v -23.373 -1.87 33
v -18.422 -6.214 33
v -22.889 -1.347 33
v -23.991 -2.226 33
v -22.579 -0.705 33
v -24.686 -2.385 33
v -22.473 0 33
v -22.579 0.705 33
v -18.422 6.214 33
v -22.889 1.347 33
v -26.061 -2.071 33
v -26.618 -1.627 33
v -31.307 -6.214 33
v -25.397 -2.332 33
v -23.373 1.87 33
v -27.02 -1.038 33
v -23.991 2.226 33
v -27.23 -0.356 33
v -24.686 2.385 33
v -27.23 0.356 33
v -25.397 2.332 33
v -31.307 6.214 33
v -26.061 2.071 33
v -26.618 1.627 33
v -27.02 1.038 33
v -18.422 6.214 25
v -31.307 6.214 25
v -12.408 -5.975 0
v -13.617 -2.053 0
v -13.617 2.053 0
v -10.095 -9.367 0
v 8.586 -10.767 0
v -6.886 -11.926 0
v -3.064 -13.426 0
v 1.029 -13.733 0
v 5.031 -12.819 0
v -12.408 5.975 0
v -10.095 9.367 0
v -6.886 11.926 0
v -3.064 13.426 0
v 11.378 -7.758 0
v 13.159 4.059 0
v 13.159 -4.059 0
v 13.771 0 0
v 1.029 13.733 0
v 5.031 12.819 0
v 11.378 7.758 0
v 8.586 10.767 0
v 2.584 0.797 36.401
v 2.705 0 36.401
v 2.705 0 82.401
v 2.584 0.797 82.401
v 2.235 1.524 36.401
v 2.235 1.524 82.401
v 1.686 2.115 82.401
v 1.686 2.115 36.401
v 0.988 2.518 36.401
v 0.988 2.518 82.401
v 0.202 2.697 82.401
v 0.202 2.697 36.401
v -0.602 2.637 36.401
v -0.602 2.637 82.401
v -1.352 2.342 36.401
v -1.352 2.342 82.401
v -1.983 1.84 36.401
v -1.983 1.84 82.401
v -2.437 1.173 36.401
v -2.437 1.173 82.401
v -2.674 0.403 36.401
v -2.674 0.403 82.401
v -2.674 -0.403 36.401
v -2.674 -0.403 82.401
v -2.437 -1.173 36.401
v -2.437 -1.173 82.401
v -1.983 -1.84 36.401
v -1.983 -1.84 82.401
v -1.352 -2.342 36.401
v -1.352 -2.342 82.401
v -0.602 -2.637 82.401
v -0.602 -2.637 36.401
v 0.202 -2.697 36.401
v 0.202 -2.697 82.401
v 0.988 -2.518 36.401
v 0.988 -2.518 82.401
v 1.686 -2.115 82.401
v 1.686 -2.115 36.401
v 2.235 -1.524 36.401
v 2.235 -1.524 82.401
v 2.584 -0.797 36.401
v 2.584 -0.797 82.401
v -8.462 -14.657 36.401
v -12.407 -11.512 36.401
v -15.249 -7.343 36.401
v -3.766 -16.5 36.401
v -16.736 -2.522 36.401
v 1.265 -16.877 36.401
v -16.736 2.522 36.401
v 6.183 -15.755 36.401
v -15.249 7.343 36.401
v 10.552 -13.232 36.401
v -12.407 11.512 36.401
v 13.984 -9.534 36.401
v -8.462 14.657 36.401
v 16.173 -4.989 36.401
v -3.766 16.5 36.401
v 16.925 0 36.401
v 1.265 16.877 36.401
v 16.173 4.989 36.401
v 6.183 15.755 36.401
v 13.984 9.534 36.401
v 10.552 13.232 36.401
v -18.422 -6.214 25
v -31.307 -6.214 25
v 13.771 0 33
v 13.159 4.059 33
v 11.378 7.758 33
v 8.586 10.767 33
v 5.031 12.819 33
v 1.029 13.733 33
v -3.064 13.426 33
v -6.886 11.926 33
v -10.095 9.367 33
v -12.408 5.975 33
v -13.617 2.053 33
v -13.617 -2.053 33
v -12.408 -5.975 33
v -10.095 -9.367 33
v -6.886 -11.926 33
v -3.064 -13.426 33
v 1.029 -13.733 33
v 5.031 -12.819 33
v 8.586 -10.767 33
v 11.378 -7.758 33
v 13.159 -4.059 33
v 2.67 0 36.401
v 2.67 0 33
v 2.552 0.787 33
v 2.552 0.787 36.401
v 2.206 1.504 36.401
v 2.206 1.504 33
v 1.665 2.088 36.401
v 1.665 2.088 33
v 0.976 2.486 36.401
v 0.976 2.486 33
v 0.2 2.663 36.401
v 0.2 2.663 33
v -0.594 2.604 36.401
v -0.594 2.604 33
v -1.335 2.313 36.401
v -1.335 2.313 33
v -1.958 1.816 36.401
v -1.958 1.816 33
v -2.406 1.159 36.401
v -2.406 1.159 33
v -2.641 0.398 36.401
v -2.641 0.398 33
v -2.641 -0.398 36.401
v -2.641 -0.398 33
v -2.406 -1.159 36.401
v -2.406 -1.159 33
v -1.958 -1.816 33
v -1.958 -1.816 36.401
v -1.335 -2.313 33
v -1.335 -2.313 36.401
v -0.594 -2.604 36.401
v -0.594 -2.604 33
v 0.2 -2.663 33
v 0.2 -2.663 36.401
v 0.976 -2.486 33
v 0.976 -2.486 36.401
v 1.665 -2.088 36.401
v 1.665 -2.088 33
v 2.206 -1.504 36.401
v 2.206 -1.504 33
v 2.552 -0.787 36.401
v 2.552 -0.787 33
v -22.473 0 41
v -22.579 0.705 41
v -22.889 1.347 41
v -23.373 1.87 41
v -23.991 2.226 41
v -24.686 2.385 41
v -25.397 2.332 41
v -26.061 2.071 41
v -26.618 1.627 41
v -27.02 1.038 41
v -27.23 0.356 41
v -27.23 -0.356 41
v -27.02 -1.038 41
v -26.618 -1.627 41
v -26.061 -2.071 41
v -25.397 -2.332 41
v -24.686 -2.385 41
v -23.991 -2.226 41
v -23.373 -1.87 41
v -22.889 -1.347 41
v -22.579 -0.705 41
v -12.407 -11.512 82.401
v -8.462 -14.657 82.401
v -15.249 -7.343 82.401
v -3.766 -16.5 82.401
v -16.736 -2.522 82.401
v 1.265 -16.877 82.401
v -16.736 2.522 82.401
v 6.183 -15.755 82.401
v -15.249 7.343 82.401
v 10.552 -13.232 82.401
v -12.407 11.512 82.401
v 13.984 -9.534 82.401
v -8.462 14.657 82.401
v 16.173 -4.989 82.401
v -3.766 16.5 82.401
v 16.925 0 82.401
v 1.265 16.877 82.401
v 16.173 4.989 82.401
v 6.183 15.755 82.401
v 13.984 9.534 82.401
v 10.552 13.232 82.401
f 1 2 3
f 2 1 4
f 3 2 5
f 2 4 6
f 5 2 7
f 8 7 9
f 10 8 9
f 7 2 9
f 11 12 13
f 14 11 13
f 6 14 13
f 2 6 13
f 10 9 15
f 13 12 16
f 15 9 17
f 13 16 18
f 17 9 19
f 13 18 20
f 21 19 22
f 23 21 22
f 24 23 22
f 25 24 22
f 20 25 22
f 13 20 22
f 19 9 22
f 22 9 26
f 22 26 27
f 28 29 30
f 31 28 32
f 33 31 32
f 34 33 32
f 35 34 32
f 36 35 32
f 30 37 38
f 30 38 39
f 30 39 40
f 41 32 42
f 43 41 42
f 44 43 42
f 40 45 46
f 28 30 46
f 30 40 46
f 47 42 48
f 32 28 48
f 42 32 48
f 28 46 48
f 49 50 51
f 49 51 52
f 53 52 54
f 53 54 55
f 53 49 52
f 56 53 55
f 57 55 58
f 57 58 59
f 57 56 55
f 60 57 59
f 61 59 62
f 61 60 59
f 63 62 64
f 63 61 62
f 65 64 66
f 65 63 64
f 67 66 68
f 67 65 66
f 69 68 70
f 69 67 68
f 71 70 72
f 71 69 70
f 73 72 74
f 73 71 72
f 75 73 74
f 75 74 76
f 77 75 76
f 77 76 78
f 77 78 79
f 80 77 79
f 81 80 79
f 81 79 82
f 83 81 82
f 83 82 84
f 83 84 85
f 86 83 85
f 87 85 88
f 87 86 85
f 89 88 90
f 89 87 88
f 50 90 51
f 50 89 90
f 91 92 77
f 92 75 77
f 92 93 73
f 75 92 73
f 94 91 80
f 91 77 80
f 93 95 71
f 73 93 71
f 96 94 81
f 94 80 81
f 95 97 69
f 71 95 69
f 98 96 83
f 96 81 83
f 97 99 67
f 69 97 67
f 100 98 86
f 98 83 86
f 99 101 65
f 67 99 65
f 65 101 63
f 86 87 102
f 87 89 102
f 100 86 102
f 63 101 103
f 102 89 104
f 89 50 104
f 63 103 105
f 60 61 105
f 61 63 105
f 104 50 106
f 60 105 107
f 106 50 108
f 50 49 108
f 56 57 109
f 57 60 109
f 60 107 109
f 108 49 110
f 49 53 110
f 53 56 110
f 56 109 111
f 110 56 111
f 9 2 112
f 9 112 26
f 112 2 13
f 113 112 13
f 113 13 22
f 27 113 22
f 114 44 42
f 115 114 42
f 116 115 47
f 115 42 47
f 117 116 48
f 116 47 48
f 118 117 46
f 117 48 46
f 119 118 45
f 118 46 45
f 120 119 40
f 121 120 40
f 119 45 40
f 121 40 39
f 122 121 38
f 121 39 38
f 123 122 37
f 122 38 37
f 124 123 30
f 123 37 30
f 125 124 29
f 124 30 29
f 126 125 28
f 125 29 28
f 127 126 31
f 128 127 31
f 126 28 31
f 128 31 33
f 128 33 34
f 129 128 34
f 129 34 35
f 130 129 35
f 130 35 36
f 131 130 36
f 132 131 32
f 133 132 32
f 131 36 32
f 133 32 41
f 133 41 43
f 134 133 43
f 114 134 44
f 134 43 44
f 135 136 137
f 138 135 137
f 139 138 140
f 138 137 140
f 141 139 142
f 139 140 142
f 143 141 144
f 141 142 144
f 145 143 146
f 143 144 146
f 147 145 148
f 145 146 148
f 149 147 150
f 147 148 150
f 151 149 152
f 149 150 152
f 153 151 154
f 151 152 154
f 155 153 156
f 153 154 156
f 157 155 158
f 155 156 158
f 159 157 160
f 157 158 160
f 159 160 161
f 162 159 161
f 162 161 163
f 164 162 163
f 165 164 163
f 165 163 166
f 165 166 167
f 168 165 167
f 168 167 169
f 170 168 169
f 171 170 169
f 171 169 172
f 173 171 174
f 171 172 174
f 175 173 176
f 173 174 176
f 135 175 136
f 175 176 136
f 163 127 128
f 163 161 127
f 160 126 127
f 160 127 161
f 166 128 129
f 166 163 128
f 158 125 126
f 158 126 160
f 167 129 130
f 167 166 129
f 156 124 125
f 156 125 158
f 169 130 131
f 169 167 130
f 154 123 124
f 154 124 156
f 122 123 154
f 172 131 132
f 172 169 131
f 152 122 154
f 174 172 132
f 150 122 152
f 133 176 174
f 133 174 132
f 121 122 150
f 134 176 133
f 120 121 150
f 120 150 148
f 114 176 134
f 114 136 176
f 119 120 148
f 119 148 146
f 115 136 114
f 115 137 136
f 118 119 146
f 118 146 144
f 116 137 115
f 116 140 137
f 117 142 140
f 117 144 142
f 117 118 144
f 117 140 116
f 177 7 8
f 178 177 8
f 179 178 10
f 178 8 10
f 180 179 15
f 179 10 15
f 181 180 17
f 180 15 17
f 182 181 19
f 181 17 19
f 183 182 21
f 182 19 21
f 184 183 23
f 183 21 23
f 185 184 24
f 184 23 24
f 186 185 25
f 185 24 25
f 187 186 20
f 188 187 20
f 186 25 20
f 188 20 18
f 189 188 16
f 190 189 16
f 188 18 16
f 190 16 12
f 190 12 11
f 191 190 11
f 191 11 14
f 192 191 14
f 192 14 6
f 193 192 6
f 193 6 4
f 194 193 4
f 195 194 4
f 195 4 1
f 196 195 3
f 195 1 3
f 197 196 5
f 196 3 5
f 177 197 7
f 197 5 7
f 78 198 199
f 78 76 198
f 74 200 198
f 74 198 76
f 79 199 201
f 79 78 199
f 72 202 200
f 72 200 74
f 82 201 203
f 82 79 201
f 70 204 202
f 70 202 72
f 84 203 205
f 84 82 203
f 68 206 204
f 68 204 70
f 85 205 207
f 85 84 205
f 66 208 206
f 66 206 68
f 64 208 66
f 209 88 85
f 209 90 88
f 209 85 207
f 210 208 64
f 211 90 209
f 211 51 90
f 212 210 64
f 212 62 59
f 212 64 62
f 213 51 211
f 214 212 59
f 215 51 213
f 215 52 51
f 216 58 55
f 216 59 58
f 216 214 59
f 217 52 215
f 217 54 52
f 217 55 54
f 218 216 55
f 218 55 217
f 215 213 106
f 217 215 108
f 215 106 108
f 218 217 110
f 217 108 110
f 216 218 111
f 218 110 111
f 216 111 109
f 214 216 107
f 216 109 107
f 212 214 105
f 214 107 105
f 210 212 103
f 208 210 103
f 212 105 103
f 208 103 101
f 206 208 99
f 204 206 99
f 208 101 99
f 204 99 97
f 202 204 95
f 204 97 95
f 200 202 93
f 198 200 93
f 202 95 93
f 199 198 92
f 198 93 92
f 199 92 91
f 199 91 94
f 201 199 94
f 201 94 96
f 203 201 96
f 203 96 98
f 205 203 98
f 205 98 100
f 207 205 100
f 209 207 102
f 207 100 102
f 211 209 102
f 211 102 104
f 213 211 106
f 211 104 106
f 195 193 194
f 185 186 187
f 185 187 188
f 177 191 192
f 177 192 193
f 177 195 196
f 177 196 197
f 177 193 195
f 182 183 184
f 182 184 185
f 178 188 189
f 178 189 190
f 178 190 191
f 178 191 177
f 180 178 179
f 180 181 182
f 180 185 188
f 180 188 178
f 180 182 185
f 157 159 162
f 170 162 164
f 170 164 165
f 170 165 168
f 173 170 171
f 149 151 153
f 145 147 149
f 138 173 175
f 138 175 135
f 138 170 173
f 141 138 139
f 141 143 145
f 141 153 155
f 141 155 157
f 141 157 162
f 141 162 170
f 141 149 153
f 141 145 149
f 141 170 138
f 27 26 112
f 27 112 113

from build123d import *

# Parameters (mm, degrees)
SKETCH2_R           = 13.771311666
BOSS_EXTRUDE1_DEPTH = 33
SKETCH4_R           = 2.670460619
BOSS_EXTRUDE2_DEPTH = 3.401159468
SKETCH5_R           = 2.391755936
BOSS_EXTRUDE3_DEPTH = 8
SKETCH6_W           = 12.884717539
SKETCH6_H           = 12.427625198
BOSS_EXTRUDE4_DEPTH = 8
SKETCH24_R          = 16.92460457
SKETCH24_R_2        = 2.7046062
BOSS_EXTRUDE9_DEPTH = 46


with BuildPart() as part:
    # Sketch2 → Boss-Extrude1 (new body)
    with BuildSketch(Plane.XY):
        Circle(SKETCH2_R)
    extrude(amount=BOSS_EXTRUDE1_DEPTH)

    # Sketch4 → Boss-Extrude2 (add)
    with BuildSketch(Plane.XY.offset(33)):
        Circle(SKETCH4_R)
    extrude(amount=BOSS_EXTRUDE2_DEPTH)


with BuildPart() as body_2:
    # Sketch5 → Boss-Extrude3 (new body)
    with BuildSketch(Plane.XY.offset(33)):
        with Locations((-24.864724485, 0)):
            Circle(SKETCH5_R)
    extrude(amount=BOSS_EXTRUDE3_DEPTH)

    # Sketch6 → Boss-Extrude4 (add)
    with BuildSketch(Plane(origin=(0, 0, 33), x_dir=(-1, 0, 0), z_dir=(0, 0, -1))):
        with Locations((24.864724486, 0)):
            Rectangle(SKETCH6_W, SKETCH6_H)
    extrude(amount=BOSS_EXTRUDE4_DEPTH)


with BuildPart() as body_3:
    # Sketch24 → Boss-Extrude9 (new body)
    with BuildSketch(Plane.XY.offset(36.401159468)):
        Circle(SKETCH24_R)
        Circle(SKETCH24_R_2, mode=Mode.SUBTRACT)
    extrude(amount=BOSS_EXTRUDE9_DEPTH)


solid = Compound([part.part, body_2.part, body_3.part])
